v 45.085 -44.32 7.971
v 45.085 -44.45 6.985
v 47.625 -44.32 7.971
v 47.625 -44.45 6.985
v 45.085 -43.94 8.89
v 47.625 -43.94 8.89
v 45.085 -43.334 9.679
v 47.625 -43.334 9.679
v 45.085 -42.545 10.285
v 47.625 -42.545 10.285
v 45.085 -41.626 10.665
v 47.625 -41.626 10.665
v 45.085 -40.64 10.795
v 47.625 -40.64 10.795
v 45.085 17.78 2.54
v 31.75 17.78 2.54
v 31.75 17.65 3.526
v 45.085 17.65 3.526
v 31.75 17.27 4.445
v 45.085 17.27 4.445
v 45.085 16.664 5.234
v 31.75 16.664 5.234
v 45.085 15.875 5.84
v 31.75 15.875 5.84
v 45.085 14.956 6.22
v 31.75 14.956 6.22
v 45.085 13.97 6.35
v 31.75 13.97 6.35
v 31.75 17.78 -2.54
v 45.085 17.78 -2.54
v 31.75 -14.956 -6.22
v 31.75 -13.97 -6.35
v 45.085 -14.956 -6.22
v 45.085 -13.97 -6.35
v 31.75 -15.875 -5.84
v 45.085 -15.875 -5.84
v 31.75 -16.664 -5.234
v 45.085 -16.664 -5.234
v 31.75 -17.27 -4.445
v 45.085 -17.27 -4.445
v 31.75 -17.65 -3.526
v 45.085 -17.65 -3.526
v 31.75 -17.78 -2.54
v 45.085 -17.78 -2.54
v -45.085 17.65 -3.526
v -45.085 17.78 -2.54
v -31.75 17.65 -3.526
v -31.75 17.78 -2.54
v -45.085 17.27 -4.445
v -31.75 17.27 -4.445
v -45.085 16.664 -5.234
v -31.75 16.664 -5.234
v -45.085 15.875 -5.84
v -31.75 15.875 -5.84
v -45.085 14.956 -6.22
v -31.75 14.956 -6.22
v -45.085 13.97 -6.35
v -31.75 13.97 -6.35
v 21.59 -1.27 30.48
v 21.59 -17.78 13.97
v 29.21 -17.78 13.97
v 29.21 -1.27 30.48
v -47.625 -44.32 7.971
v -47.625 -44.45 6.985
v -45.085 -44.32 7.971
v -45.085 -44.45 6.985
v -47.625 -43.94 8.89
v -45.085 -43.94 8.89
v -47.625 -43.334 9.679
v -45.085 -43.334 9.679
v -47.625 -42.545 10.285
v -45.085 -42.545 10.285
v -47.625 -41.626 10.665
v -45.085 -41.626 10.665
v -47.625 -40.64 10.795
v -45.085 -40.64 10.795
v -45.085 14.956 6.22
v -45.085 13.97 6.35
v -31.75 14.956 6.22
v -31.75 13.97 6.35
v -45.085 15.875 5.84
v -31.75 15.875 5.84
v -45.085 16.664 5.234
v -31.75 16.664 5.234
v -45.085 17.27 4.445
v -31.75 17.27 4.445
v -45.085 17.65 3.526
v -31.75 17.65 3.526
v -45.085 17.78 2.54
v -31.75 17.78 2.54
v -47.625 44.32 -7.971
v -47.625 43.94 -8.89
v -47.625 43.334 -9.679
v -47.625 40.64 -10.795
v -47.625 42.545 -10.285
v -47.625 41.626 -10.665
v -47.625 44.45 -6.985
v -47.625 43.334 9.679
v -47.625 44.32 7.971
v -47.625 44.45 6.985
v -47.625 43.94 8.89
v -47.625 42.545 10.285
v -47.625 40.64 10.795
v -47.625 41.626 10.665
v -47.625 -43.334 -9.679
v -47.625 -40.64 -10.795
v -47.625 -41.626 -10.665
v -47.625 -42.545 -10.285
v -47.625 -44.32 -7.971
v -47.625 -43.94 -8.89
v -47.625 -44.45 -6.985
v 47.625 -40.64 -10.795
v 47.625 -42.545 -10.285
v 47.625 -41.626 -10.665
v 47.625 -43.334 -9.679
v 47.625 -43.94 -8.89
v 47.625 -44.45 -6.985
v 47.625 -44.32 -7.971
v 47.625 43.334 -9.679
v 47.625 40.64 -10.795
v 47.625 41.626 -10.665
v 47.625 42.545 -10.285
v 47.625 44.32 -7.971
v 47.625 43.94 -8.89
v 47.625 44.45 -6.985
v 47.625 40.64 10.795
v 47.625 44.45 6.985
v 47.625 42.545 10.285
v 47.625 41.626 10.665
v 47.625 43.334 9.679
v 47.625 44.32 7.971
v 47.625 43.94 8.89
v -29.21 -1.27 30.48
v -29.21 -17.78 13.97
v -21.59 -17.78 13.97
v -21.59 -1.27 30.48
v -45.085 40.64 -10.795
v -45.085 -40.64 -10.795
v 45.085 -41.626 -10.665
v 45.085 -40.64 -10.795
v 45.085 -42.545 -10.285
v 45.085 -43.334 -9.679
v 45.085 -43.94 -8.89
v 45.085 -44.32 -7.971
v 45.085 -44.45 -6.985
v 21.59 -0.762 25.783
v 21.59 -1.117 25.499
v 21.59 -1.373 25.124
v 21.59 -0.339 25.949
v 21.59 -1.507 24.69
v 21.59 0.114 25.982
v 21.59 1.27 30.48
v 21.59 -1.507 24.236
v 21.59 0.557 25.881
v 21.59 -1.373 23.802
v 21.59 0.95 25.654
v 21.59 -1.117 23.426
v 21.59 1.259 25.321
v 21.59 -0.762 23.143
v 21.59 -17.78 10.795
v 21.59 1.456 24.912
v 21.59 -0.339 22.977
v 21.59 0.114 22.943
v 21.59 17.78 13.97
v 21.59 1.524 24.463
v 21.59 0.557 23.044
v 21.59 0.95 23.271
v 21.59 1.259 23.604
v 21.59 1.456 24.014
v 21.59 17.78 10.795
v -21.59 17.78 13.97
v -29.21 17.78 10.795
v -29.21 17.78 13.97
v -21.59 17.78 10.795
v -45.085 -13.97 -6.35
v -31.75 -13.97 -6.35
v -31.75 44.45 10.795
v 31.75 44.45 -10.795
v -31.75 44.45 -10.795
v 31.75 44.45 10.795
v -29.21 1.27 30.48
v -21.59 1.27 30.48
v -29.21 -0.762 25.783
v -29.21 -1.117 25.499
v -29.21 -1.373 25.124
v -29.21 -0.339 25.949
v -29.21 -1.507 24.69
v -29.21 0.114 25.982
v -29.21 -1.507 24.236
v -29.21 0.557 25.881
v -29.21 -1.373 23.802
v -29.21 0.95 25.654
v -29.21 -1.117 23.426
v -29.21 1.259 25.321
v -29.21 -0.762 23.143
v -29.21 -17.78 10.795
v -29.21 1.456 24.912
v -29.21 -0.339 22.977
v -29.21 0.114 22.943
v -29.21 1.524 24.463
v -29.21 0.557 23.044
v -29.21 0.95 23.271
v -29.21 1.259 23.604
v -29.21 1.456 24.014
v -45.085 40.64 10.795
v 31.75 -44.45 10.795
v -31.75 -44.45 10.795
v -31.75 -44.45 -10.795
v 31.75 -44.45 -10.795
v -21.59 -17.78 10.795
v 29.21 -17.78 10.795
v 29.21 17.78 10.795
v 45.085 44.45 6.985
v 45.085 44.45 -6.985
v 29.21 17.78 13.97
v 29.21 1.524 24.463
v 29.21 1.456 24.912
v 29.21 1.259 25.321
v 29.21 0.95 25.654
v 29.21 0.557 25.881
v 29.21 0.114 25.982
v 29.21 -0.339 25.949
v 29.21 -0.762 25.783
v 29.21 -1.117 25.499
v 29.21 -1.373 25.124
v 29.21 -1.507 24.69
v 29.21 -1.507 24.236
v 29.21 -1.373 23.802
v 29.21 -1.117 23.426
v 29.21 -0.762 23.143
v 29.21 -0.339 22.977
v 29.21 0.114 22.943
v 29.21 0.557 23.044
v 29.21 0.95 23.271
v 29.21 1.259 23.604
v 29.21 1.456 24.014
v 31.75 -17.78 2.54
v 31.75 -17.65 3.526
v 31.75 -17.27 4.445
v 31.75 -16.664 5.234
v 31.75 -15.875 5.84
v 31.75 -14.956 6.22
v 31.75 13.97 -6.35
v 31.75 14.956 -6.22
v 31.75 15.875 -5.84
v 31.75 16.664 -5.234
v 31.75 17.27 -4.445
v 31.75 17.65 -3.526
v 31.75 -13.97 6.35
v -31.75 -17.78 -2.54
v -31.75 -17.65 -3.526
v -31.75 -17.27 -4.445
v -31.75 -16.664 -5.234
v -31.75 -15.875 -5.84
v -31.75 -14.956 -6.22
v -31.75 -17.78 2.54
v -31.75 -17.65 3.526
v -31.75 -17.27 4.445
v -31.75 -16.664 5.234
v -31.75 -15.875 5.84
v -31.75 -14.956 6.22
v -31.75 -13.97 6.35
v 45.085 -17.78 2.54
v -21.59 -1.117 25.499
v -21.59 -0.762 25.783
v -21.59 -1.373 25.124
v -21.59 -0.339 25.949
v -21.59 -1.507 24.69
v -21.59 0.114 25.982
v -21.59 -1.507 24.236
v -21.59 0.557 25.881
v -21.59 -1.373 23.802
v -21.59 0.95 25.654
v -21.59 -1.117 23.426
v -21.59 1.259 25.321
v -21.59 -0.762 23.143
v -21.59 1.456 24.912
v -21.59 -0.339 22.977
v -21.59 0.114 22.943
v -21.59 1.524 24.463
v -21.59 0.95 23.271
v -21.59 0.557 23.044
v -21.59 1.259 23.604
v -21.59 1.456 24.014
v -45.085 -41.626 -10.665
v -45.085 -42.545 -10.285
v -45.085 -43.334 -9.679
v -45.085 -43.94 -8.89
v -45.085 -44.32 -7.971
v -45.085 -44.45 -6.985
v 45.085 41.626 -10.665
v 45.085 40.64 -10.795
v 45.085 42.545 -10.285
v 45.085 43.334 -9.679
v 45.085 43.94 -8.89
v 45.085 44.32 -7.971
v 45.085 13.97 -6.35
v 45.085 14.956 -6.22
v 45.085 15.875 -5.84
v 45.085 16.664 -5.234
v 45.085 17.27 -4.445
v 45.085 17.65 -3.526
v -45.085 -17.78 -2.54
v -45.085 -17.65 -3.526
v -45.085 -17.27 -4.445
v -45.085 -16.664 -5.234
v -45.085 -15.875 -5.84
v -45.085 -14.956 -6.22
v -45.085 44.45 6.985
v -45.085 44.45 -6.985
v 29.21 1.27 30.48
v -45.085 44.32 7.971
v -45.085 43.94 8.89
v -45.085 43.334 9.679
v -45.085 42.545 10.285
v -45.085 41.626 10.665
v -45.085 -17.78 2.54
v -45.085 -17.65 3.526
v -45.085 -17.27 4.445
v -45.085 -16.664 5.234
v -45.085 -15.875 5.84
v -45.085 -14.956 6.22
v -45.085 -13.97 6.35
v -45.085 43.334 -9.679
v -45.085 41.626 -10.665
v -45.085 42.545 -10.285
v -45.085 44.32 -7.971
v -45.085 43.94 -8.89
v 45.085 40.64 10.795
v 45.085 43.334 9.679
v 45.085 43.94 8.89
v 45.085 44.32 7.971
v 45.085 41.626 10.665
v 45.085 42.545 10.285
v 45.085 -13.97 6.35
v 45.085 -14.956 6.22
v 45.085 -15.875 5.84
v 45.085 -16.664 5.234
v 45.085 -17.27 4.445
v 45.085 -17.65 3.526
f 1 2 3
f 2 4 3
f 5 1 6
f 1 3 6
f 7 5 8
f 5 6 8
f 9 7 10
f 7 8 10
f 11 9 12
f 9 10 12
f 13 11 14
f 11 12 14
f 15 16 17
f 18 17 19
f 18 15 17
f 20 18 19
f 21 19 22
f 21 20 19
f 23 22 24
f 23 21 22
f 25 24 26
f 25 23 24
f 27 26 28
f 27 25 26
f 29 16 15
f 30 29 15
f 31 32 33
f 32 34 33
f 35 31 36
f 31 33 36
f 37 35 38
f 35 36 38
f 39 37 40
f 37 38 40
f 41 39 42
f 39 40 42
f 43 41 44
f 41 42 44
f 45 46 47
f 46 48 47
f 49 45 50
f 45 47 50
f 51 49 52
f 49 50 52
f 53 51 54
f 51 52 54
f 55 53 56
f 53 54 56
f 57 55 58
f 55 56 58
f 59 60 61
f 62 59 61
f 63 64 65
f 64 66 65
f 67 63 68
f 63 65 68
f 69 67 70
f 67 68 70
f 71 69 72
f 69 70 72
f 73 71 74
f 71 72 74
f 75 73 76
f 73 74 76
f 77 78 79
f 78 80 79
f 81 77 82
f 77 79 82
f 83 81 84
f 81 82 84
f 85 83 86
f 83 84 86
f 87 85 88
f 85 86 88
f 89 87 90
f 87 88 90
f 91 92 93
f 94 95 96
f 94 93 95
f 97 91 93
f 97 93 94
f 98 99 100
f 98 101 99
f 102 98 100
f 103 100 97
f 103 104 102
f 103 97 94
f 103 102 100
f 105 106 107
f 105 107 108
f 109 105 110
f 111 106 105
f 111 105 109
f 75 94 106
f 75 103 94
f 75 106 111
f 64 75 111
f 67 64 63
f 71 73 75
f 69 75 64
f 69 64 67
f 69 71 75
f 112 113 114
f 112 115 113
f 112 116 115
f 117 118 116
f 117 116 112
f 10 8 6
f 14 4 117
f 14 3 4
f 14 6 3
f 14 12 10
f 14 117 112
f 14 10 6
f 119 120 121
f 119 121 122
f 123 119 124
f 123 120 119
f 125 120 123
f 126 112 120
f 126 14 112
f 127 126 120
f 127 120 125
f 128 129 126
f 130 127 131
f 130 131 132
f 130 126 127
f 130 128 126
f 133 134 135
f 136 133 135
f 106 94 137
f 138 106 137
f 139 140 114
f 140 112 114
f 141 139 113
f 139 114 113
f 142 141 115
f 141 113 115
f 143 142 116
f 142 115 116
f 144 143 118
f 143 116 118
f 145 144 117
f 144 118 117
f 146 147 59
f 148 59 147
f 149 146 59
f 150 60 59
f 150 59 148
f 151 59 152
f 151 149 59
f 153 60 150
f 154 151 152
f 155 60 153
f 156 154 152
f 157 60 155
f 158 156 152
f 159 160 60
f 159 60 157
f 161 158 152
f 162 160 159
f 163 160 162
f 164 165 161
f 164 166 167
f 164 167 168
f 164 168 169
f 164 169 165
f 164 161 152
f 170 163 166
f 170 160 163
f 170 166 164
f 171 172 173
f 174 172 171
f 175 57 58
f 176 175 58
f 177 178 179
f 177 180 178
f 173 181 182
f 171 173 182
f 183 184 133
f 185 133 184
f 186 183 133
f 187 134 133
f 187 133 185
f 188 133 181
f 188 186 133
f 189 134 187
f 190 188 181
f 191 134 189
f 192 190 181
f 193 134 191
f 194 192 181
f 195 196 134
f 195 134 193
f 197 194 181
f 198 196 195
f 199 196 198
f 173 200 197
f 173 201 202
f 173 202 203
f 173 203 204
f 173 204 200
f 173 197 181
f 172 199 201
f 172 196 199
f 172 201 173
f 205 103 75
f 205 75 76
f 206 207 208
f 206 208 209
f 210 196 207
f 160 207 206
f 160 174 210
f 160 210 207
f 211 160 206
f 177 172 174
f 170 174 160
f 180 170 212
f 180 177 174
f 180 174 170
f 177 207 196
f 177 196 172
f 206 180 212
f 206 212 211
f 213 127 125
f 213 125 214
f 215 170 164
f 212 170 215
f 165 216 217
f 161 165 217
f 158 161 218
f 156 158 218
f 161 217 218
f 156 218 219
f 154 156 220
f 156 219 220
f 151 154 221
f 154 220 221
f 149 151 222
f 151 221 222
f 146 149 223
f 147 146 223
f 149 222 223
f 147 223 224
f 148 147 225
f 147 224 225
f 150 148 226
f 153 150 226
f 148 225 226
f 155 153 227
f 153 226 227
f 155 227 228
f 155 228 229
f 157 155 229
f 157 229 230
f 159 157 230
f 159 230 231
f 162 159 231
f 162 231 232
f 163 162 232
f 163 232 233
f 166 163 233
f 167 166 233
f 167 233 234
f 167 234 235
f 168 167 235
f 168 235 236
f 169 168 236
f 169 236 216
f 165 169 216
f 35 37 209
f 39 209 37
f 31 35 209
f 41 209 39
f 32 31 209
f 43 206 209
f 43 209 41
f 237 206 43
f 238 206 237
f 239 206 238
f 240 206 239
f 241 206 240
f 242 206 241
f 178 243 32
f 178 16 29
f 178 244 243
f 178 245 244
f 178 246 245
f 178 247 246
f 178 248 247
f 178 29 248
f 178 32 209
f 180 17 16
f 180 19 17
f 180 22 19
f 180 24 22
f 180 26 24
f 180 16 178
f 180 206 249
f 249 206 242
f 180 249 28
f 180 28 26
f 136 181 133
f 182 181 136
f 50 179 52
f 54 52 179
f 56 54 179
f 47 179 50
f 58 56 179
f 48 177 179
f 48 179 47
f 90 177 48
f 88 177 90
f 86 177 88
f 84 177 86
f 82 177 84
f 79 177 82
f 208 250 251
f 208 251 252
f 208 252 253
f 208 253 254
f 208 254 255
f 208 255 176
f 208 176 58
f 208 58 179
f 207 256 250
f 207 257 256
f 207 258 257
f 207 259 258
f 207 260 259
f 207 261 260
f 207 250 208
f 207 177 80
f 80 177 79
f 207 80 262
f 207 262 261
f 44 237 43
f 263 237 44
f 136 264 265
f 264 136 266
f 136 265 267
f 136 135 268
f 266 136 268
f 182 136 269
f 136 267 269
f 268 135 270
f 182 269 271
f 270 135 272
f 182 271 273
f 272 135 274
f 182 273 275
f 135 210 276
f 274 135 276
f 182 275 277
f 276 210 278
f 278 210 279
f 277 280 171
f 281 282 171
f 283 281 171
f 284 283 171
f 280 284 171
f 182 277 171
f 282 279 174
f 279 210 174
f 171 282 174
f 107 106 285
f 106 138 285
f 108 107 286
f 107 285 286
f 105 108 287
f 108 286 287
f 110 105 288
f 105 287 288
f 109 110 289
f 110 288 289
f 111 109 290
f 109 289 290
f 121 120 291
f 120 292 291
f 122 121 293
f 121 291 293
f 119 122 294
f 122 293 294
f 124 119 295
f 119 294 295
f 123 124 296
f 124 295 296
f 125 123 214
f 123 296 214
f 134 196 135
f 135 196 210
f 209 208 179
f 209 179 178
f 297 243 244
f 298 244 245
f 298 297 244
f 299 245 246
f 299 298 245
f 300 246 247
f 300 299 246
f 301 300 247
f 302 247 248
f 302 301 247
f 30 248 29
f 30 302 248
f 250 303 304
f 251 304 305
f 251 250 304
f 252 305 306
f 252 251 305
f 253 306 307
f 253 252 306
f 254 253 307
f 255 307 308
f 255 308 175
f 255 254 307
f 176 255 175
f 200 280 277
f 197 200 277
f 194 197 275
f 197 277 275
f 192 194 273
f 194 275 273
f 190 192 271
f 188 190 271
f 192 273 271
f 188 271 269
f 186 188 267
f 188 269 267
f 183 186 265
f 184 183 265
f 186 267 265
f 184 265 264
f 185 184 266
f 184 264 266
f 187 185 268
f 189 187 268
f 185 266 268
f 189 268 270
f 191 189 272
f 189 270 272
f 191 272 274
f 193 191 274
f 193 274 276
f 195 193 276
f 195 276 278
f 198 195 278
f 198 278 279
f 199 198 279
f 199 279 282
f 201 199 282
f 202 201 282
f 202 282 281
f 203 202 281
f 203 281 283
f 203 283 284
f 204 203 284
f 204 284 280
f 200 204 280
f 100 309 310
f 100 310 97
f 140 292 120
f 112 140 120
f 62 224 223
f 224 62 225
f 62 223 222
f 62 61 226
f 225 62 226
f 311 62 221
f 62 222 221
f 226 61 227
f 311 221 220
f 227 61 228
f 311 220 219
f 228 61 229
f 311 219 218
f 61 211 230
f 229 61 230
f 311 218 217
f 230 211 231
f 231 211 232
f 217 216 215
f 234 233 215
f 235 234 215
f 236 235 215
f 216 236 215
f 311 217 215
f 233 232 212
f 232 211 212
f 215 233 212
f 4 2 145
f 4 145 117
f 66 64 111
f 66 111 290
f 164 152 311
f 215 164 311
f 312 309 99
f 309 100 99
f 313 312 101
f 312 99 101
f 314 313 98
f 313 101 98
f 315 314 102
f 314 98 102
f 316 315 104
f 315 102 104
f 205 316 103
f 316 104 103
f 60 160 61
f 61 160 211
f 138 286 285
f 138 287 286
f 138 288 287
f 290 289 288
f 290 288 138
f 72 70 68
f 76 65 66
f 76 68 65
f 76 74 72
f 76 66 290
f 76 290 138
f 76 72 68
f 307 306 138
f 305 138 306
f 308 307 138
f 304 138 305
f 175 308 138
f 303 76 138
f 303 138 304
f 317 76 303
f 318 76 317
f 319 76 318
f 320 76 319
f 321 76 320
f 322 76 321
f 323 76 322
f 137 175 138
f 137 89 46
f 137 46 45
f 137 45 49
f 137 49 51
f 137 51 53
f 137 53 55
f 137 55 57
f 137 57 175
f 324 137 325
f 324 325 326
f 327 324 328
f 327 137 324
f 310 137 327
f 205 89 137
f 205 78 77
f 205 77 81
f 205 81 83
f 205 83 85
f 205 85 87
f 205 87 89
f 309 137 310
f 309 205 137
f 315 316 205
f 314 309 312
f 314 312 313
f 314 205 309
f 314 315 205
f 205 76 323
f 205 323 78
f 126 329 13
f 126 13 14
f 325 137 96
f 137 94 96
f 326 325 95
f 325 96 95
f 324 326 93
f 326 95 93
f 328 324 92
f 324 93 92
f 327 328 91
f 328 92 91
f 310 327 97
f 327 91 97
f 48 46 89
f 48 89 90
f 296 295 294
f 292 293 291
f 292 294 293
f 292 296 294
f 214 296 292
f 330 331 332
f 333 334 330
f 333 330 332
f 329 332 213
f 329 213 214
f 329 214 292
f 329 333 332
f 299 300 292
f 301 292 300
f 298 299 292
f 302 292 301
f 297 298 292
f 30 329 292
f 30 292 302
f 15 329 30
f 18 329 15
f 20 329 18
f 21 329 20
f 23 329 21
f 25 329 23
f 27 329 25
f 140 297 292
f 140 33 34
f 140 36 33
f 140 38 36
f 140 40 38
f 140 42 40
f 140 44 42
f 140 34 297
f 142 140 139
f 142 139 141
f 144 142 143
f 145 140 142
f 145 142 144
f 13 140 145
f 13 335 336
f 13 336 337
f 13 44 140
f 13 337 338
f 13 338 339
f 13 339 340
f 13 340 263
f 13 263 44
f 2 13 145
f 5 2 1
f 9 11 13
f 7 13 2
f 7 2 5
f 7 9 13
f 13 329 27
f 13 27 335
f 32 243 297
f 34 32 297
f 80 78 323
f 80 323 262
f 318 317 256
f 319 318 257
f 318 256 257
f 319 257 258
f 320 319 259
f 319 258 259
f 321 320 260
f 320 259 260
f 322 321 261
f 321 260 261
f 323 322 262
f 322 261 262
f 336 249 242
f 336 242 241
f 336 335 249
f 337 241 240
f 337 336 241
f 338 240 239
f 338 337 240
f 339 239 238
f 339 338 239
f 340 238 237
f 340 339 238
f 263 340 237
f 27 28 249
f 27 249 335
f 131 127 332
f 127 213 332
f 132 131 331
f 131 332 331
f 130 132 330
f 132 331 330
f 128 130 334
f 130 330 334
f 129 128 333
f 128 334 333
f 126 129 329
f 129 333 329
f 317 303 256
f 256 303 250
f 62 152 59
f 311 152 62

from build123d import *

# Parameters (mm, degrees)
F0_W     = 7.62
F0_H     = 35.56
F1_DEPTH = 10.795
F0_W_2   = 13.335
F2_DEPTH = 6.35
F3_DEPTH = 10.795
F4_DEPTH = 30.48
F5_R     = 3.81
F6_SIZE  = 16.51
F7_R     = 1.524
F8_DEPTH = 76.836
F9_R     = 3.81


# Not quite as in the source:
# - a feature names something its author has since deleted; it is built from what else it names


with BuildPart() as f1:
    # F0 (on Top) → F1 (new body, symmetric)
    with BuildSketch(Plane.XY):
        Polygon((31.75, 44.45), (-31.75, 44.45), (-31.75, 17.78), (-31.75, -17.78), (-31.75, -44.45), (-29.21, -44.45), (31.75, -44.45), (31.75, -31.7187323975), (31.75, -17.78), (31.75, 17.78), align=None)
        with Locations((-25.4, 0)):
            Rectangle(F0_W, F0_H, mode=Mode.SUBTRACT)
        with Locations((25.4, 0)):
            Rectangle(F0_W, F0_H, mode=Mode.SUBTRACT)
    extrude(amount=F1_DEPTH, both=True)



with BuildPart() as f1b:
    # F0 (on Top) → F1, piece 2 (new body, symmetric)
    with BuildSketch(Plane.XY):
        Polygon((-45.085, -17.78), (-45.085, 17.78), (-45.085, 44.45), (-47.625, 44.45), (-47.625, -31.75), (-47.625, -44.45), (-45.085, -44.45), align=None)
    extrude(amount=F1_DEPTH, both=True)


with BuildPart() as f1c:
    # F0 (on Top) → F1, piece 3 (new body, symmetric)
    with BuildSketch(Plane.XY):
        Polygon((45.085, 44.45), (45.085, 17.78), (45.085, -17.78), (45.085, -44.45), (47.625, -44.45), (47.625, -31.75), (47.625, 44.45), align=None)
    extrude(amount=F1_DEPTH, both=True)


with BuildPart() as f1_1:
    add(f1.part)

    add(f1b.part)  # F2 merges F1b

    add(f1c.part)  # F2 merges F1c
    # F0 (on Top) → F2 (join, symmetric)
    with BuildSketch(Plane.XY):
        with Locations((-38.4175, 0)):
            Rectangle(F0_W_2, F0_H)
        with Locations((38.4175, 0)):
            Rectangle(F0_W_2, F0_H)
    extrude(amount=F2_DEPTH, both=True)

    # F0 (on Top) → F3 (join)
    with BuildSketch(Plane.XY):
        with Locations((25.4, 0)):
            Rectangle(F0_W, F0_H)
        with Locations((-25.4, 0)):
            Rectangle(F0_W, F0_H)
    extrude(amount=-F3_DEPTH)

    # F0 (on Top) → F4 (join)
    with BuildSketch(Plane.XY):
        with Locations((25.4, 0)):
            Rectangle(F0_W, F0_H)
        with Locations((-25.4, 0)):
            Rectangle(F0_W, F0_H)
    extrude(amount=F4_DEPTH)

    # F5
    f5_edges = [f1_1.edges().sort_by_distance(p)[0] for p in [
        (38.4175, -17.78, 6.35),
        (38.4175, -17.78, -6.35),
        (38.4175, 17.78, 6.35),
        (38.4175, 17.78, -6.35),
        (-38.4175, 17.78, -6.35),
        (-38.4175, -17.78, -6.35),
        (-38.4175, 17.78, 6.35),
        (-38.4175, -17.78, 6.35),
    ]]
    fillet(f5_edges, radius=F5_R)

    # F6
    f6_edges = [f1_1.edges().sort_by_distance(p)[0] for p in [
        (25.4, 17.78, 30.48),
        (-25.4, 17.78, 30.48),
        (25.4, -17.78, 30.48),
        (-25.4, -17.78, 30.48),
    ]]
    chamfer(f6_edges, length=F6_SIZE)

    # F7 (on face) → F8 (cut, through all)
    with BuildSketch(Plane.YZ.offset(29.21)):
        with Locations((0, 24.4627408683)):
            Circle(F7_R)
    extrude(amount=-F8_DEPTH, mode=Mode.SUBTRACT)

    # F9
    f9_edges = [f1_1.edges().sort_by_distance(p)[0] for p in [
        (46.355, 44.45, 10.795),
        (-46.355, 44.45, 10.795),
        (-46.355, 44.45, -10.795),
        (46.355, 44.45, -10.795),
        (-46.355, -44.45, 10.795),
        (-46.355, -44.45, -10.795),
        (46.355, -44.45, -10.795),
        (46.355, -44.45, 10.795),
    ]]
    fillet(f9_edges, radius=F9_R)


solid = f1_1.part
